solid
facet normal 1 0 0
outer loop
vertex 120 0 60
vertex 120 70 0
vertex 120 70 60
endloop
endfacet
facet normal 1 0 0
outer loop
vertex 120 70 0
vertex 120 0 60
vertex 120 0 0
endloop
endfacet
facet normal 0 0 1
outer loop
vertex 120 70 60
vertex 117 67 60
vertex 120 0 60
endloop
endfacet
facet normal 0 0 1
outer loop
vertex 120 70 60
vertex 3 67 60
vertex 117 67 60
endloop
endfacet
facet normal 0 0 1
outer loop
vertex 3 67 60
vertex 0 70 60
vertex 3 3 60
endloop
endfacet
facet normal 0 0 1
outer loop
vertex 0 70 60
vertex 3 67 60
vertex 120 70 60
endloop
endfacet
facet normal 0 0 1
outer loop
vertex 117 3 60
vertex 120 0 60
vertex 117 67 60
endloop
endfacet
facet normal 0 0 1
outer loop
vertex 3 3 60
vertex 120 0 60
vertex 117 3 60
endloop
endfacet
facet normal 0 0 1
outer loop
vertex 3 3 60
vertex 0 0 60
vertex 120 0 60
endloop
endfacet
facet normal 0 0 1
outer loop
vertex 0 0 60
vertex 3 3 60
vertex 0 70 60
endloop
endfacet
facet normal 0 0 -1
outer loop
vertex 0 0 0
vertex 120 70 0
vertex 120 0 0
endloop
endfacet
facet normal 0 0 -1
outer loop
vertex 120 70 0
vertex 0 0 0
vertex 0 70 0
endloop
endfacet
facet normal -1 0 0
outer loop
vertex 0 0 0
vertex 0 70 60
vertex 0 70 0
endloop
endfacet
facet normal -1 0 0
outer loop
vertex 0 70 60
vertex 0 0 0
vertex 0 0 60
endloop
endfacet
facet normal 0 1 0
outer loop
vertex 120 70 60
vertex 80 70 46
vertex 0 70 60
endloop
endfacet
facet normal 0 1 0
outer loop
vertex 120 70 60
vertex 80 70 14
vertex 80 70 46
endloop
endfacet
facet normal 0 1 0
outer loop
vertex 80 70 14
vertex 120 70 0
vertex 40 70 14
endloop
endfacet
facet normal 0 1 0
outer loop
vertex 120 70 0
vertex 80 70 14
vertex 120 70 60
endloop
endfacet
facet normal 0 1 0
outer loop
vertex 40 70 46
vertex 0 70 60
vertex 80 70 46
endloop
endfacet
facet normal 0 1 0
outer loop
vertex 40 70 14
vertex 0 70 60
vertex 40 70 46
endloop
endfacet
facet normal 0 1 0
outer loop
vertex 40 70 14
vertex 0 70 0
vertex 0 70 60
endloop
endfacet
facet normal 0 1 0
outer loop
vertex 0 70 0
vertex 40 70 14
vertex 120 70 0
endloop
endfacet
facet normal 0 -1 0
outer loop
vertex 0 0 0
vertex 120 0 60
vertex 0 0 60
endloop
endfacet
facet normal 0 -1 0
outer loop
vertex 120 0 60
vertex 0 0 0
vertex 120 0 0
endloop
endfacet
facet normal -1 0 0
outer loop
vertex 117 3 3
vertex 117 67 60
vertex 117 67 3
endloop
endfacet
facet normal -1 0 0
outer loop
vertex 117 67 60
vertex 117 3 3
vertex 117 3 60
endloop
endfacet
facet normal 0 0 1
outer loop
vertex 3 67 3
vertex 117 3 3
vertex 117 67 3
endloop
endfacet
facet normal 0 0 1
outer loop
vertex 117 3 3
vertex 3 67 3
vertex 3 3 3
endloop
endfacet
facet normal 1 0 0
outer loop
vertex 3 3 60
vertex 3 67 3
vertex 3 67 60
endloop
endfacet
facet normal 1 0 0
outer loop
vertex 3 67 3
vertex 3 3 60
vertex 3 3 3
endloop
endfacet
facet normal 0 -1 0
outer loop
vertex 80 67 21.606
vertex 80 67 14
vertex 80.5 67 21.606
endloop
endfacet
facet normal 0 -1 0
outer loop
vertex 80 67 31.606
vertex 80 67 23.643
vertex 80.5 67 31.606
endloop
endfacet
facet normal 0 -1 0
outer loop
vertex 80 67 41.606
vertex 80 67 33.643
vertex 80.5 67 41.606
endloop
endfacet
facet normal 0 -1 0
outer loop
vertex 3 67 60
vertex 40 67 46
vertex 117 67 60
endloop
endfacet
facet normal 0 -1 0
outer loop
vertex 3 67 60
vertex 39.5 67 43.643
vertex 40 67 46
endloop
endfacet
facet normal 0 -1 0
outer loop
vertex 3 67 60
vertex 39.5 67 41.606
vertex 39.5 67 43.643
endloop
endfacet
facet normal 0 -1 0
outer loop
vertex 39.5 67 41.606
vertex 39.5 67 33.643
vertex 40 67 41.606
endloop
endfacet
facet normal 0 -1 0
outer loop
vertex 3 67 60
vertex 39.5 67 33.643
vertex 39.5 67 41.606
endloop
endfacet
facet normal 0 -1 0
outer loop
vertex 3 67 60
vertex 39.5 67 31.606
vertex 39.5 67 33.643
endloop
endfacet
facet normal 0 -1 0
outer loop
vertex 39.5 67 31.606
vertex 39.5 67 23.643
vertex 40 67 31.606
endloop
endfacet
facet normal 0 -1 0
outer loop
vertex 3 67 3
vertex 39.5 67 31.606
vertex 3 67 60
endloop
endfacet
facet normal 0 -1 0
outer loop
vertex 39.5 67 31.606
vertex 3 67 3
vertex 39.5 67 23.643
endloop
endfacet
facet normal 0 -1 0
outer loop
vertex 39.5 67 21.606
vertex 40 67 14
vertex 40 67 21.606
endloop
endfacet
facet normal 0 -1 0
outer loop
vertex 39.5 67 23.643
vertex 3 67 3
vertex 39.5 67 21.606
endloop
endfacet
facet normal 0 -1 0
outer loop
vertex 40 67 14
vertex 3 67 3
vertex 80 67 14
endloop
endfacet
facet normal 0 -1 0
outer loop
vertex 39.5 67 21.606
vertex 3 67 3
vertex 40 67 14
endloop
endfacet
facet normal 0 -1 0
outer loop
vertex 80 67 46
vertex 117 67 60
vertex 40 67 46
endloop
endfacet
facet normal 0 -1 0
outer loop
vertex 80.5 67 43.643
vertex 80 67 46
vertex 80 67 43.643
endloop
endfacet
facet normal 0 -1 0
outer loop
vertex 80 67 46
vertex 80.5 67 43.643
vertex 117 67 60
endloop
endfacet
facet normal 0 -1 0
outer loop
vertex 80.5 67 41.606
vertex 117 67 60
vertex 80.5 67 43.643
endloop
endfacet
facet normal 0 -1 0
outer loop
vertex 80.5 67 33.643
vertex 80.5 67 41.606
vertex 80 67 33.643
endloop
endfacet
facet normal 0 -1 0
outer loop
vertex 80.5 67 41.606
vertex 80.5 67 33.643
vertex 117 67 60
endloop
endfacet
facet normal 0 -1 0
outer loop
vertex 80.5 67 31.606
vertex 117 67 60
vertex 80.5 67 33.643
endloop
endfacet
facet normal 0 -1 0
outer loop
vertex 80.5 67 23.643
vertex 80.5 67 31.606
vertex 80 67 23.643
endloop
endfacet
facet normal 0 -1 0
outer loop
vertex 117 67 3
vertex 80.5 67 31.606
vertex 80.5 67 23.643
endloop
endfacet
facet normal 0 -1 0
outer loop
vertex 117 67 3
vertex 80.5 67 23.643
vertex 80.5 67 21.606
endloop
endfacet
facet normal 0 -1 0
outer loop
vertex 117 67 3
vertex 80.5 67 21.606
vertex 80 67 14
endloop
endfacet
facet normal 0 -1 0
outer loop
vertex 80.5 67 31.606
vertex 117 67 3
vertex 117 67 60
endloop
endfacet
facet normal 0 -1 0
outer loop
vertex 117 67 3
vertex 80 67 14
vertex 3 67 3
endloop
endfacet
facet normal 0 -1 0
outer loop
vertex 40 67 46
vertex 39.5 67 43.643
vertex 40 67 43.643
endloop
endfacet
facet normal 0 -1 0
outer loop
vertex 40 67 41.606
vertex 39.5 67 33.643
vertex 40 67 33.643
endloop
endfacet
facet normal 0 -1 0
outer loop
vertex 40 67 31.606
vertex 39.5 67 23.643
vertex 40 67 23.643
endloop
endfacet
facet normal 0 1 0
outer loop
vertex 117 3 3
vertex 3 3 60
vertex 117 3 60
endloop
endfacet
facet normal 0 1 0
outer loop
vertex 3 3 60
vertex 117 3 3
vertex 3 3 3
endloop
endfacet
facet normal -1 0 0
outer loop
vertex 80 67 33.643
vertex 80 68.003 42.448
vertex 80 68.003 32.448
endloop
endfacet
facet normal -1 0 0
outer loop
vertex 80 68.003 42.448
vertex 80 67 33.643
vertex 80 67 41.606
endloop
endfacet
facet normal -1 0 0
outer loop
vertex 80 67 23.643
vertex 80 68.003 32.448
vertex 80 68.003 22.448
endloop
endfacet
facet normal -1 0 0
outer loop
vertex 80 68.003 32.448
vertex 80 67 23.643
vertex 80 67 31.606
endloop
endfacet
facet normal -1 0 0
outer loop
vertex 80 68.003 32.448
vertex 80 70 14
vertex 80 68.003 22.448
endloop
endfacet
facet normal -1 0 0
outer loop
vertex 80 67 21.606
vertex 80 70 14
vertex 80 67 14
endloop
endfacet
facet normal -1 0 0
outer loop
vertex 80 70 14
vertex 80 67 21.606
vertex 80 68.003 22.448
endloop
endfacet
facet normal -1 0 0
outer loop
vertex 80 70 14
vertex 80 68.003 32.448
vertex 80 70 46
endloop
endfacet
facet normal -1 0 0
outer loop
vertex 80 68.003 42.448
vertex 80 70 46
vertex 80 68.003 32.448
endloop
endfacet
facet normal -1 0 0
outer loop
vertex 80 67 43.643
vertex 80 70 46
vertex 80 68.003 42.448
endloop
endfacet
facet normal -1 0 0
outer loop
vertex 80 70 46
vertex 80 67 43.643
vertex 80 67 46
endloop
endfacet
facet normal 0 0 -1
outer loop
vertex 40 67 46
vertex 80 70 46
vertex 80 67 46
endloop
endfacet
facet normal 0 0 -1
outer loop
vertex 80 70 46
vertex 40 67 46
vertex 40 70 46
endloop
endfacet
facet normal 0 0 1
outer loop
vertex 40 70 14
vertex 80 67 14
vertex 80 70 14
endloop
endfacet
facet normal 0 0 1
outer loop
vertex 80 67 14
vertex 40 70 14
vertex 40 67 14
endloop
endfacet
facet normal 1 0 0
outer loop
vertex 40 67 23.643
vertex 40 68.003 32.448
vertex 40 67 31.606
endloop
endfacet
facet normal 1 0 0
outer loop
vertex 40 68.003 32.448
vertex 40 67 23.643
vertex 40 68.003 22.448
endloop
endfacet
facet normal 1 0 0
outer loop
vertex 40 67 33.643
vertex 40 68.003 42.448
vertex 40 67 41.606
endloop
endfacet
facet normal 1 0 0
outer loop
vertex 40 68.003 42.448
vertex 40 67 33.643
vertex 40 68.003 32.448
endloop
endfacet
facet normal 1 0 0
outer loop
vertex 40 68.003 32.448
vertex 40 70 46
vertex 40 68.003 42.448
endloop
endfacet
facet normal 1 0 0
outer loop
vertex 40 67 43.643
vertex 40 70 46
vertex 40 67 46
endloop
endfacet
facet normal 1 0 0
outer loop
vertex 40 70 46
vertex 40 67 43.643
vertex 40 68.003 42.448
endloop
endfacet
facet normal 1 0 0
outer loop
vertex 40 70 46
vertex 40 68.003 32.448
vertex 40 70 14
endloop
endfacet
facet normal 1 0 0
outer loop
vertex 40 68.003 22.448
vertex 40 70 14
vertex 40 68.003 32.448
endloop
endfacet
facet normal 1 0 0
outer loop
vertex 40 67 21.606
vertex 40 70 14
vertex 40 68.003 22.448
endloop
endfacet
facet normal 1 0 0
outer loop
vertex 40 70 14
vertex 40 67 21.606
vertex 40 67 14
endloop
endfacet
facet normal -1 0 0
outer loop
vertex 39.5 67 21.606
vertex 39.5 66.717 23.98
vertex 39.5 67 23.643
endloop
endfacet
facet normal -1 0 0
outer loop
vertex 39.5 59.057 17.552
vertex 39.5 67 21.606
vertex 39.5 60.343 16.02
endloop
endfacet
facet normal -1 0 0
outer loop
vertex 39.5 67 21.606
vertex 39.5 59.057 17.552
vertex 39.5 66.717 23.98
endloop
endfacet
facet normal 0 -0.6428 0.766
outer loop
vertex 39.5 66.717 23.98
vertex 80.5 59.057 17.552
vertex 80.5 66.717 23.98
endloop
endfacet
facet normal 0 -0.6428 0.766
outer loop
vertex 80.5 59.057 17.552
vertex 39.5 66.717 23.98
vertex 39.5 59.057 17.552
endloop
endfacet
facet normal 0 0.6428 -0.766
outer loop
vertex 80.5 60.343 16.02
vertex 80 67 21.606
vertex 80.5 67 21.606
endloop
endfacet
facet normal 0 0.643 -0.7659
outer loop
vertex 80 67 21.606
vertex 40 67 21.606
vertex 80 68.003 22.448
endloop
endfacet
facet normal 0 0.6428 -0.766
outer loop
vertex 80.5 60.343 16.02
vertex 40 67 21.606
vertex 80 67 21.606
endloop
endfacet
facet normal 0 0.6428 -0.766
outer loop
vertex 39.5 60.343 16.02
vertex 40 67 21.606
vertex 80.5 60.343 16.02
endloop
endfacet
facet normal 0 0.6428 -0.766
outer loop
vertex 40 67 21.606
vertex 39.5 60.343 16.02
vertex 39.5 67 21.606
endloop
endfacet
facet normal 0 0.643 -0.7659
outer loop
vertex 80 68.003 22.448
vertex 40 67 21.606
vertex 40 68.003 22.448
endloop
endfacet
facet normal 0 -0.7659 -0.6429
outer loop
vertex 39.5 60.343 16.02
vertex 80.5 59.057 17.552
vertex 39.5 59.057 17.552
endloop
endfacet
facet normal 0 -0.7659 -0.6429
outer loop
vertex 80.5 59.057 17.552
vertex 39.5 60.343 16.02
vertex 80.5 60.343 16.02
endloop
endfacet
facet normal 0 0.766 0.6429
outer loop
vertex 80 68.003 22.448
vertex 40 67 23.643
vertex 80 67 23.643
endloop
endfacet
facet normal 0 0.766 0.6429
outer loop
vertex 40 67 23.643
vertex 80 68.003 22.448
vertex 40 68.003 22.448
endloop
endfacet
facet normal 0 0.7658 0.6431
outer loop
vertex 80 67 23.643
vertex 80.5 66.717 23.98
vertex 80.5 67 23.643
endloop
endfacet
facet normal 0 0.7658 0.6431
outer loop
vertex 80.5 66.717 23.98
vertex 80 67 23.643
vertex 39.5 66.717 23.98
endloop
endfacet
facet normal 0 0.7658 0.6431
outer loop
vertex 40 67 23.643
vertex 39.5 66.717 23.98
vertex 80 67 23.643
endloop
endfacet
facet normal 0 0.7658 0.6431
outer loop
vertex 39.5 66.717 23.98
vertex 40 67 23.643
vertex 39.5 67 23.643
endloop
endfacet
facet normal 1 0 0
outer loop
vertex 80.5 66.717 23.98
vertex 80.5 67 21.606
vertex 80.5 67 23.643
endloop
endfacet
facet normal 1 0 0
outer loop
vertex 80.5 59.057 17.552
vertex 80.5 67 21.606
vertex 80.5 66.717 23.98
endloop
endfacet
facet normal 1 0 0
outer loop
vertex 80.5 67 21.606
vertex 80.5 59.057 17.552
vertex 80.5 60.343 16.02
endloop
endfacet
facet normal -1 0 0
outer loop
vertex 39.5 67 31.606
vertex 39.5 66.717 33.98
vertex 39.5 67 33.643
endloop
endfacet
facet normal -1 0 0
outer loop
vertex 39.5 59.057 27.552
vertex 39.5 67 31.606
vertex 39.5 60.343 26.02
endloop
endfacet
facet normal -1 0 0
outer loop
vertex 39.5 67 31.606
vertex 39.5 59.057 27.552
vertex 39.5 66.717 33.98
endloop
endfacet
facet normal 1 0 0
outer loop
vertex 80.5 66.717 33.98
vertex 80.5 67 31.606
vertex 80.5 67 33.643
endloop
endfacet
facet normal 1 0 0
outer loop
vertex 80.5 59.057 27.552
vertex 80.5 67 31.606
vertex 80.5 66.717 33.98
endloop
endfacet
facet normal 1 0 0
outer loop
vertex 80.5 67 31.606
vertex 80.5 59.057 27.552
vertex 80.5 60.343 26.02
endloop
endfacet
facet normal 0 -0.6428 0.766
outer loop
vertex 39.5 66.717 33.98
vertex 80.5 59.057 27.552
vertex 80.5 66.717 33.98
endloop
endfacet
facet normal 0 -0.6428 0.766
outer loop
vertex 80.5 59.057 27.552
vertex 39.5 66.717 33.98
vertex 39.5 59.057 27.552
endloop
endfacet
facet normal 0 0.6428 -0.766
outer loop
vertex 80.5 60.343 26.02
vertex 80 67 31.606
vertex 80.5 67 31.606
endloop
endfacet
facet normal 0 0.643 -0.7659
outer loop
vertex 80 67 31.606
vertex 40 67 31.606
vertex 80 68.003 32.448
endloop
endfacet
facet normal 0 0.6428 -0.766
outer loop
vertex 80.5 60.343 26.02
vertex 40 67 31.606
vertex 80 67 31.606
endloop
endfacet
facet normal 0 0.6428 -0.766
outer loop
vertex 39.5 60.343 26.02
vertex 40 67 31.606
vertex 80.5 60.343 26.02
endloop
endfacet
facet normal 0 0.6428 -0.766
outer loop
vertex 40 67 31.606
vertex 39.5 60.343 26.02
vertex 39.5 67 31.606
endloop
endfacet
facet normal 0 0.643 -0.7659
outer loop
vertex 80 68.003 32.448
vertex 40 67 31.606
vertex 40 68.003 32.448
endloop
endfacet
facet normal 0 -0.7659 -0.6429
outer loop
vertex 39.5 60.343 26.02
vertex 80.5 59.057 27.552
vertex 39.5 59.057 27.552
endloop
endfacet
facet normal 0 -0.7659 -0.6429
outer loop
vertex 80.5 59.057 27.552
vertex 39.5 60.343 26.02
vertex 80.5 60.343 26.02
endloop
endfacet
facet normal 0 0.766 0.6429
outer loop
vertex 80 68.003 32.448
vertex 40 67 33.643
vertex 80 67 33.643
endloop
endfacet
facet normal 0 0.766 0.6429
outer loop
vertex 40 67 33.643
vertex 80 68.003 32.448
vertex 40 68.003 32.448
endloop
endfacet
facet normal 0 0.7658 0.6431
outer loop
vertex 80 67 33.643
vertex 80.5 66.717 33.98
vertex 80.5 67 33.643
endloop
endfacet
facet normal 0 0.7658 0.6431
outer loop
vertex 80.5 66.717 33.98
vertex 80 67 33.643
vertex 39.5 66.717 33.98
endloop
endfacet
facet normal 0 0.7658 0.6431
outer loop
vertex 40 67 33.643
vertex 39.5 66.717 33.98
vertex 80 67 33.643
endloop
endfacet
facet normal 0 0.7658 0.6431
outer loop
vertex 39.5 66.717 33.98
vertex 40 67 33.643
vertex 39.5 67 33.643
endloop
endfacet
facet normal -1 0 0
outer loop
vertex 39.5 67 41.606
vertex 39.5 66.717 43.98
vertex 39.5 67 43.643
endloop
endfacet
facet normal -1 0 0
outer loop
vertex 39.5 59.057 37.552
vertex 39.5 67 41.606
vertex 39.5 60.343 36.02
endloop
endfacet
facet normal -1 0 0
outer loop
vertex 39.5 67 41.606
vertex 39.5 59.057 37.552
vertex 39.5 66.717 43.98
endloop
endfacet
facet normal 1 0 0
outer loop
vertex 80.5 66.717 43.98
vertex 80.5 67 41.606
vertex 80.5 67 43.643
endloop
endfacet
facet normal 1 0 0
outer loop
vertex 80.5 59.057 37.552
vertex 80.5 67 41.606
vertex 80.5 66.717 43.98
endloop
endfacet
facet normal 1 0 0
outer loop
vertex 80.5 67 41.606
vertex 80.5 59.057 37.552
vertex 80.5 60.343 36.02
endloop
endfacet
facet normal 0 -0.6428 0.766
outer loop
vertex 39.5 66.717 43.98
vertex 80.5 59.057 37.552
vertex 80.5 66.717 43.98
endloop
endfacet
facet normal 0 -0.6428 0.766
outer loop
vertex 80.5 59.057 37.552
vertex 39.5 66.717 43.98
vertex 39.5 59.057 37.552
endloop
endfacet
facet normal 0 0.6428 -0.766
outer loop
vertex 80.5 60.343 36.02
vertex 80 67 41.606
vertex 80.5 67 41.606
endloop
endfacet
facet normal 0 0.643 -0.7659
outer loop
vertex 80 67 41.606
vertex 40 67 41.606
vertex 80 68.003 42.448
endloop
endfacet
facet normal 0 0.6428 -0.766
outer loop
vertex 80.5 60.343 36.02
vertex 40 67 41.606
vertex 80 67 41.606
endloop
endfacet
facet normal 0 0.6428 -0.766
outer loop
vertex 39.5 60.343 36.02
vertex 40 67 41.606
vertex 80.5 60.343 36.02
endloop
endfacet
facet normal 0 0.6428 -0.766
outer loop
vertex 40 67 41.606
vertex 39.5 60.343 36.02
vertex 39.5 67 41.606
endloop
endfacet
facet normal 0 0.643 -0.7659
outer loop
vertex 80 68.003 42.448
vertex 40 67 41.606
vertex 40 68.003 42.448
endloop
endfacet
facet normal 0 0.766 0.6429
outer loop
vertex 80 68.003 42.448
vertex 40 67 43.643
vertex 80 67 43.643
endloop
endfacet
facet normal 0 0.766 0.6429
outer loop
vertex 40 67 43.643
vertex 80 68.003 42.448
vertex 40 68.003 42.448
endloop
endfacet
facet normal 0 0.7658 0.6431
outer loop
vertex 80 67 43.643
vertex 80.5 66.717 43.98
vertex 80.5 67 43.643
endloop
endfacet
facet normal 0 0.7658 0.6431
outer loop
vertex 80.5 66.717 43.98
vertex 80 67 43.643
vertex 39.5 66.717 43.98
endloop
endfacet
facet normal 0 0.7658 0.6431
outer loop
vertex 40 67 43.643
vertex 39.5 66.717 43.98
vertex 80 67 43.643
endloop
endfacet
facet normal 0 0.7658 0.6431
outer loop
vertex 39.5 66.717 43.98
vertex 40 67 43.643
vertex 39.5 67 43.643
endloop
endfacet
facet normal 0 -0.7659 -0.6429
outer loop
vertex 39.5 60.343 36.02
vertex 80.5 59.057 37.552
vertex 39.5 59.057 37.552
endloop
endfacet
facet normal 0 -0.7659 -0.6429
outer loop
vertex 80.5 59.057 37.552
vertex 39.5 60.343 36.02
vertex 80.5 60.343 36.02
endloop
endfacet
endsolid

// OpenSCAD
$fn = 32;

// ----------------------------------------------------------------------
// Vent box: louvers enclosure
// ----------------------------------------------------------------------

// --- parameters (mm) ---
box_l = 120;              // box length, X
box_w = 70;               // box width, Y
box_h = 60;               // box height, Z
wall_t = 3;               // shell wall thickness
win_l = 40;               // vent window width, X
win_h = 32;               // vent window height, Z
slat_t = 2;               // louver slat thickness
slat_d = 10;              // louver slat depth
slat_a = 40;              // louver slat angle, degrees
slat_pitch = 10;          // louver pitch
slat_yc = 63.53;          // slat centreline Y

win_z0 = (box_h - win_h) / 2;  // window lower edge Z
n_slats = 3;  // louver count
slat_z0 = win_z0 + (win_h - (n_slats - 1) * slat_pitch) / 2;

difference() {
  union() {
    difference() {
      cube([box_l, box_w, box_h]);
  translate([wall_t, wall_t, wall_t])
    cube([box_l - 2 * wall_t, box_w - 2 * wall_t, box_h]);
  translate([(box_l - win_l) / 2, box_w - wall_t - 1, win_z0])
    cube([win_l, wall_t + 2, win_h]);
    }
    for (i = [0 : n_slats - 1])
      translate([box_l / 2, slat_yc, slat_z0 + i * slat_pitch])
        rotate([slat_a, 0, 0])
          cube([win_l + 1, slat_d, slat_t], center = true);
  }
}
